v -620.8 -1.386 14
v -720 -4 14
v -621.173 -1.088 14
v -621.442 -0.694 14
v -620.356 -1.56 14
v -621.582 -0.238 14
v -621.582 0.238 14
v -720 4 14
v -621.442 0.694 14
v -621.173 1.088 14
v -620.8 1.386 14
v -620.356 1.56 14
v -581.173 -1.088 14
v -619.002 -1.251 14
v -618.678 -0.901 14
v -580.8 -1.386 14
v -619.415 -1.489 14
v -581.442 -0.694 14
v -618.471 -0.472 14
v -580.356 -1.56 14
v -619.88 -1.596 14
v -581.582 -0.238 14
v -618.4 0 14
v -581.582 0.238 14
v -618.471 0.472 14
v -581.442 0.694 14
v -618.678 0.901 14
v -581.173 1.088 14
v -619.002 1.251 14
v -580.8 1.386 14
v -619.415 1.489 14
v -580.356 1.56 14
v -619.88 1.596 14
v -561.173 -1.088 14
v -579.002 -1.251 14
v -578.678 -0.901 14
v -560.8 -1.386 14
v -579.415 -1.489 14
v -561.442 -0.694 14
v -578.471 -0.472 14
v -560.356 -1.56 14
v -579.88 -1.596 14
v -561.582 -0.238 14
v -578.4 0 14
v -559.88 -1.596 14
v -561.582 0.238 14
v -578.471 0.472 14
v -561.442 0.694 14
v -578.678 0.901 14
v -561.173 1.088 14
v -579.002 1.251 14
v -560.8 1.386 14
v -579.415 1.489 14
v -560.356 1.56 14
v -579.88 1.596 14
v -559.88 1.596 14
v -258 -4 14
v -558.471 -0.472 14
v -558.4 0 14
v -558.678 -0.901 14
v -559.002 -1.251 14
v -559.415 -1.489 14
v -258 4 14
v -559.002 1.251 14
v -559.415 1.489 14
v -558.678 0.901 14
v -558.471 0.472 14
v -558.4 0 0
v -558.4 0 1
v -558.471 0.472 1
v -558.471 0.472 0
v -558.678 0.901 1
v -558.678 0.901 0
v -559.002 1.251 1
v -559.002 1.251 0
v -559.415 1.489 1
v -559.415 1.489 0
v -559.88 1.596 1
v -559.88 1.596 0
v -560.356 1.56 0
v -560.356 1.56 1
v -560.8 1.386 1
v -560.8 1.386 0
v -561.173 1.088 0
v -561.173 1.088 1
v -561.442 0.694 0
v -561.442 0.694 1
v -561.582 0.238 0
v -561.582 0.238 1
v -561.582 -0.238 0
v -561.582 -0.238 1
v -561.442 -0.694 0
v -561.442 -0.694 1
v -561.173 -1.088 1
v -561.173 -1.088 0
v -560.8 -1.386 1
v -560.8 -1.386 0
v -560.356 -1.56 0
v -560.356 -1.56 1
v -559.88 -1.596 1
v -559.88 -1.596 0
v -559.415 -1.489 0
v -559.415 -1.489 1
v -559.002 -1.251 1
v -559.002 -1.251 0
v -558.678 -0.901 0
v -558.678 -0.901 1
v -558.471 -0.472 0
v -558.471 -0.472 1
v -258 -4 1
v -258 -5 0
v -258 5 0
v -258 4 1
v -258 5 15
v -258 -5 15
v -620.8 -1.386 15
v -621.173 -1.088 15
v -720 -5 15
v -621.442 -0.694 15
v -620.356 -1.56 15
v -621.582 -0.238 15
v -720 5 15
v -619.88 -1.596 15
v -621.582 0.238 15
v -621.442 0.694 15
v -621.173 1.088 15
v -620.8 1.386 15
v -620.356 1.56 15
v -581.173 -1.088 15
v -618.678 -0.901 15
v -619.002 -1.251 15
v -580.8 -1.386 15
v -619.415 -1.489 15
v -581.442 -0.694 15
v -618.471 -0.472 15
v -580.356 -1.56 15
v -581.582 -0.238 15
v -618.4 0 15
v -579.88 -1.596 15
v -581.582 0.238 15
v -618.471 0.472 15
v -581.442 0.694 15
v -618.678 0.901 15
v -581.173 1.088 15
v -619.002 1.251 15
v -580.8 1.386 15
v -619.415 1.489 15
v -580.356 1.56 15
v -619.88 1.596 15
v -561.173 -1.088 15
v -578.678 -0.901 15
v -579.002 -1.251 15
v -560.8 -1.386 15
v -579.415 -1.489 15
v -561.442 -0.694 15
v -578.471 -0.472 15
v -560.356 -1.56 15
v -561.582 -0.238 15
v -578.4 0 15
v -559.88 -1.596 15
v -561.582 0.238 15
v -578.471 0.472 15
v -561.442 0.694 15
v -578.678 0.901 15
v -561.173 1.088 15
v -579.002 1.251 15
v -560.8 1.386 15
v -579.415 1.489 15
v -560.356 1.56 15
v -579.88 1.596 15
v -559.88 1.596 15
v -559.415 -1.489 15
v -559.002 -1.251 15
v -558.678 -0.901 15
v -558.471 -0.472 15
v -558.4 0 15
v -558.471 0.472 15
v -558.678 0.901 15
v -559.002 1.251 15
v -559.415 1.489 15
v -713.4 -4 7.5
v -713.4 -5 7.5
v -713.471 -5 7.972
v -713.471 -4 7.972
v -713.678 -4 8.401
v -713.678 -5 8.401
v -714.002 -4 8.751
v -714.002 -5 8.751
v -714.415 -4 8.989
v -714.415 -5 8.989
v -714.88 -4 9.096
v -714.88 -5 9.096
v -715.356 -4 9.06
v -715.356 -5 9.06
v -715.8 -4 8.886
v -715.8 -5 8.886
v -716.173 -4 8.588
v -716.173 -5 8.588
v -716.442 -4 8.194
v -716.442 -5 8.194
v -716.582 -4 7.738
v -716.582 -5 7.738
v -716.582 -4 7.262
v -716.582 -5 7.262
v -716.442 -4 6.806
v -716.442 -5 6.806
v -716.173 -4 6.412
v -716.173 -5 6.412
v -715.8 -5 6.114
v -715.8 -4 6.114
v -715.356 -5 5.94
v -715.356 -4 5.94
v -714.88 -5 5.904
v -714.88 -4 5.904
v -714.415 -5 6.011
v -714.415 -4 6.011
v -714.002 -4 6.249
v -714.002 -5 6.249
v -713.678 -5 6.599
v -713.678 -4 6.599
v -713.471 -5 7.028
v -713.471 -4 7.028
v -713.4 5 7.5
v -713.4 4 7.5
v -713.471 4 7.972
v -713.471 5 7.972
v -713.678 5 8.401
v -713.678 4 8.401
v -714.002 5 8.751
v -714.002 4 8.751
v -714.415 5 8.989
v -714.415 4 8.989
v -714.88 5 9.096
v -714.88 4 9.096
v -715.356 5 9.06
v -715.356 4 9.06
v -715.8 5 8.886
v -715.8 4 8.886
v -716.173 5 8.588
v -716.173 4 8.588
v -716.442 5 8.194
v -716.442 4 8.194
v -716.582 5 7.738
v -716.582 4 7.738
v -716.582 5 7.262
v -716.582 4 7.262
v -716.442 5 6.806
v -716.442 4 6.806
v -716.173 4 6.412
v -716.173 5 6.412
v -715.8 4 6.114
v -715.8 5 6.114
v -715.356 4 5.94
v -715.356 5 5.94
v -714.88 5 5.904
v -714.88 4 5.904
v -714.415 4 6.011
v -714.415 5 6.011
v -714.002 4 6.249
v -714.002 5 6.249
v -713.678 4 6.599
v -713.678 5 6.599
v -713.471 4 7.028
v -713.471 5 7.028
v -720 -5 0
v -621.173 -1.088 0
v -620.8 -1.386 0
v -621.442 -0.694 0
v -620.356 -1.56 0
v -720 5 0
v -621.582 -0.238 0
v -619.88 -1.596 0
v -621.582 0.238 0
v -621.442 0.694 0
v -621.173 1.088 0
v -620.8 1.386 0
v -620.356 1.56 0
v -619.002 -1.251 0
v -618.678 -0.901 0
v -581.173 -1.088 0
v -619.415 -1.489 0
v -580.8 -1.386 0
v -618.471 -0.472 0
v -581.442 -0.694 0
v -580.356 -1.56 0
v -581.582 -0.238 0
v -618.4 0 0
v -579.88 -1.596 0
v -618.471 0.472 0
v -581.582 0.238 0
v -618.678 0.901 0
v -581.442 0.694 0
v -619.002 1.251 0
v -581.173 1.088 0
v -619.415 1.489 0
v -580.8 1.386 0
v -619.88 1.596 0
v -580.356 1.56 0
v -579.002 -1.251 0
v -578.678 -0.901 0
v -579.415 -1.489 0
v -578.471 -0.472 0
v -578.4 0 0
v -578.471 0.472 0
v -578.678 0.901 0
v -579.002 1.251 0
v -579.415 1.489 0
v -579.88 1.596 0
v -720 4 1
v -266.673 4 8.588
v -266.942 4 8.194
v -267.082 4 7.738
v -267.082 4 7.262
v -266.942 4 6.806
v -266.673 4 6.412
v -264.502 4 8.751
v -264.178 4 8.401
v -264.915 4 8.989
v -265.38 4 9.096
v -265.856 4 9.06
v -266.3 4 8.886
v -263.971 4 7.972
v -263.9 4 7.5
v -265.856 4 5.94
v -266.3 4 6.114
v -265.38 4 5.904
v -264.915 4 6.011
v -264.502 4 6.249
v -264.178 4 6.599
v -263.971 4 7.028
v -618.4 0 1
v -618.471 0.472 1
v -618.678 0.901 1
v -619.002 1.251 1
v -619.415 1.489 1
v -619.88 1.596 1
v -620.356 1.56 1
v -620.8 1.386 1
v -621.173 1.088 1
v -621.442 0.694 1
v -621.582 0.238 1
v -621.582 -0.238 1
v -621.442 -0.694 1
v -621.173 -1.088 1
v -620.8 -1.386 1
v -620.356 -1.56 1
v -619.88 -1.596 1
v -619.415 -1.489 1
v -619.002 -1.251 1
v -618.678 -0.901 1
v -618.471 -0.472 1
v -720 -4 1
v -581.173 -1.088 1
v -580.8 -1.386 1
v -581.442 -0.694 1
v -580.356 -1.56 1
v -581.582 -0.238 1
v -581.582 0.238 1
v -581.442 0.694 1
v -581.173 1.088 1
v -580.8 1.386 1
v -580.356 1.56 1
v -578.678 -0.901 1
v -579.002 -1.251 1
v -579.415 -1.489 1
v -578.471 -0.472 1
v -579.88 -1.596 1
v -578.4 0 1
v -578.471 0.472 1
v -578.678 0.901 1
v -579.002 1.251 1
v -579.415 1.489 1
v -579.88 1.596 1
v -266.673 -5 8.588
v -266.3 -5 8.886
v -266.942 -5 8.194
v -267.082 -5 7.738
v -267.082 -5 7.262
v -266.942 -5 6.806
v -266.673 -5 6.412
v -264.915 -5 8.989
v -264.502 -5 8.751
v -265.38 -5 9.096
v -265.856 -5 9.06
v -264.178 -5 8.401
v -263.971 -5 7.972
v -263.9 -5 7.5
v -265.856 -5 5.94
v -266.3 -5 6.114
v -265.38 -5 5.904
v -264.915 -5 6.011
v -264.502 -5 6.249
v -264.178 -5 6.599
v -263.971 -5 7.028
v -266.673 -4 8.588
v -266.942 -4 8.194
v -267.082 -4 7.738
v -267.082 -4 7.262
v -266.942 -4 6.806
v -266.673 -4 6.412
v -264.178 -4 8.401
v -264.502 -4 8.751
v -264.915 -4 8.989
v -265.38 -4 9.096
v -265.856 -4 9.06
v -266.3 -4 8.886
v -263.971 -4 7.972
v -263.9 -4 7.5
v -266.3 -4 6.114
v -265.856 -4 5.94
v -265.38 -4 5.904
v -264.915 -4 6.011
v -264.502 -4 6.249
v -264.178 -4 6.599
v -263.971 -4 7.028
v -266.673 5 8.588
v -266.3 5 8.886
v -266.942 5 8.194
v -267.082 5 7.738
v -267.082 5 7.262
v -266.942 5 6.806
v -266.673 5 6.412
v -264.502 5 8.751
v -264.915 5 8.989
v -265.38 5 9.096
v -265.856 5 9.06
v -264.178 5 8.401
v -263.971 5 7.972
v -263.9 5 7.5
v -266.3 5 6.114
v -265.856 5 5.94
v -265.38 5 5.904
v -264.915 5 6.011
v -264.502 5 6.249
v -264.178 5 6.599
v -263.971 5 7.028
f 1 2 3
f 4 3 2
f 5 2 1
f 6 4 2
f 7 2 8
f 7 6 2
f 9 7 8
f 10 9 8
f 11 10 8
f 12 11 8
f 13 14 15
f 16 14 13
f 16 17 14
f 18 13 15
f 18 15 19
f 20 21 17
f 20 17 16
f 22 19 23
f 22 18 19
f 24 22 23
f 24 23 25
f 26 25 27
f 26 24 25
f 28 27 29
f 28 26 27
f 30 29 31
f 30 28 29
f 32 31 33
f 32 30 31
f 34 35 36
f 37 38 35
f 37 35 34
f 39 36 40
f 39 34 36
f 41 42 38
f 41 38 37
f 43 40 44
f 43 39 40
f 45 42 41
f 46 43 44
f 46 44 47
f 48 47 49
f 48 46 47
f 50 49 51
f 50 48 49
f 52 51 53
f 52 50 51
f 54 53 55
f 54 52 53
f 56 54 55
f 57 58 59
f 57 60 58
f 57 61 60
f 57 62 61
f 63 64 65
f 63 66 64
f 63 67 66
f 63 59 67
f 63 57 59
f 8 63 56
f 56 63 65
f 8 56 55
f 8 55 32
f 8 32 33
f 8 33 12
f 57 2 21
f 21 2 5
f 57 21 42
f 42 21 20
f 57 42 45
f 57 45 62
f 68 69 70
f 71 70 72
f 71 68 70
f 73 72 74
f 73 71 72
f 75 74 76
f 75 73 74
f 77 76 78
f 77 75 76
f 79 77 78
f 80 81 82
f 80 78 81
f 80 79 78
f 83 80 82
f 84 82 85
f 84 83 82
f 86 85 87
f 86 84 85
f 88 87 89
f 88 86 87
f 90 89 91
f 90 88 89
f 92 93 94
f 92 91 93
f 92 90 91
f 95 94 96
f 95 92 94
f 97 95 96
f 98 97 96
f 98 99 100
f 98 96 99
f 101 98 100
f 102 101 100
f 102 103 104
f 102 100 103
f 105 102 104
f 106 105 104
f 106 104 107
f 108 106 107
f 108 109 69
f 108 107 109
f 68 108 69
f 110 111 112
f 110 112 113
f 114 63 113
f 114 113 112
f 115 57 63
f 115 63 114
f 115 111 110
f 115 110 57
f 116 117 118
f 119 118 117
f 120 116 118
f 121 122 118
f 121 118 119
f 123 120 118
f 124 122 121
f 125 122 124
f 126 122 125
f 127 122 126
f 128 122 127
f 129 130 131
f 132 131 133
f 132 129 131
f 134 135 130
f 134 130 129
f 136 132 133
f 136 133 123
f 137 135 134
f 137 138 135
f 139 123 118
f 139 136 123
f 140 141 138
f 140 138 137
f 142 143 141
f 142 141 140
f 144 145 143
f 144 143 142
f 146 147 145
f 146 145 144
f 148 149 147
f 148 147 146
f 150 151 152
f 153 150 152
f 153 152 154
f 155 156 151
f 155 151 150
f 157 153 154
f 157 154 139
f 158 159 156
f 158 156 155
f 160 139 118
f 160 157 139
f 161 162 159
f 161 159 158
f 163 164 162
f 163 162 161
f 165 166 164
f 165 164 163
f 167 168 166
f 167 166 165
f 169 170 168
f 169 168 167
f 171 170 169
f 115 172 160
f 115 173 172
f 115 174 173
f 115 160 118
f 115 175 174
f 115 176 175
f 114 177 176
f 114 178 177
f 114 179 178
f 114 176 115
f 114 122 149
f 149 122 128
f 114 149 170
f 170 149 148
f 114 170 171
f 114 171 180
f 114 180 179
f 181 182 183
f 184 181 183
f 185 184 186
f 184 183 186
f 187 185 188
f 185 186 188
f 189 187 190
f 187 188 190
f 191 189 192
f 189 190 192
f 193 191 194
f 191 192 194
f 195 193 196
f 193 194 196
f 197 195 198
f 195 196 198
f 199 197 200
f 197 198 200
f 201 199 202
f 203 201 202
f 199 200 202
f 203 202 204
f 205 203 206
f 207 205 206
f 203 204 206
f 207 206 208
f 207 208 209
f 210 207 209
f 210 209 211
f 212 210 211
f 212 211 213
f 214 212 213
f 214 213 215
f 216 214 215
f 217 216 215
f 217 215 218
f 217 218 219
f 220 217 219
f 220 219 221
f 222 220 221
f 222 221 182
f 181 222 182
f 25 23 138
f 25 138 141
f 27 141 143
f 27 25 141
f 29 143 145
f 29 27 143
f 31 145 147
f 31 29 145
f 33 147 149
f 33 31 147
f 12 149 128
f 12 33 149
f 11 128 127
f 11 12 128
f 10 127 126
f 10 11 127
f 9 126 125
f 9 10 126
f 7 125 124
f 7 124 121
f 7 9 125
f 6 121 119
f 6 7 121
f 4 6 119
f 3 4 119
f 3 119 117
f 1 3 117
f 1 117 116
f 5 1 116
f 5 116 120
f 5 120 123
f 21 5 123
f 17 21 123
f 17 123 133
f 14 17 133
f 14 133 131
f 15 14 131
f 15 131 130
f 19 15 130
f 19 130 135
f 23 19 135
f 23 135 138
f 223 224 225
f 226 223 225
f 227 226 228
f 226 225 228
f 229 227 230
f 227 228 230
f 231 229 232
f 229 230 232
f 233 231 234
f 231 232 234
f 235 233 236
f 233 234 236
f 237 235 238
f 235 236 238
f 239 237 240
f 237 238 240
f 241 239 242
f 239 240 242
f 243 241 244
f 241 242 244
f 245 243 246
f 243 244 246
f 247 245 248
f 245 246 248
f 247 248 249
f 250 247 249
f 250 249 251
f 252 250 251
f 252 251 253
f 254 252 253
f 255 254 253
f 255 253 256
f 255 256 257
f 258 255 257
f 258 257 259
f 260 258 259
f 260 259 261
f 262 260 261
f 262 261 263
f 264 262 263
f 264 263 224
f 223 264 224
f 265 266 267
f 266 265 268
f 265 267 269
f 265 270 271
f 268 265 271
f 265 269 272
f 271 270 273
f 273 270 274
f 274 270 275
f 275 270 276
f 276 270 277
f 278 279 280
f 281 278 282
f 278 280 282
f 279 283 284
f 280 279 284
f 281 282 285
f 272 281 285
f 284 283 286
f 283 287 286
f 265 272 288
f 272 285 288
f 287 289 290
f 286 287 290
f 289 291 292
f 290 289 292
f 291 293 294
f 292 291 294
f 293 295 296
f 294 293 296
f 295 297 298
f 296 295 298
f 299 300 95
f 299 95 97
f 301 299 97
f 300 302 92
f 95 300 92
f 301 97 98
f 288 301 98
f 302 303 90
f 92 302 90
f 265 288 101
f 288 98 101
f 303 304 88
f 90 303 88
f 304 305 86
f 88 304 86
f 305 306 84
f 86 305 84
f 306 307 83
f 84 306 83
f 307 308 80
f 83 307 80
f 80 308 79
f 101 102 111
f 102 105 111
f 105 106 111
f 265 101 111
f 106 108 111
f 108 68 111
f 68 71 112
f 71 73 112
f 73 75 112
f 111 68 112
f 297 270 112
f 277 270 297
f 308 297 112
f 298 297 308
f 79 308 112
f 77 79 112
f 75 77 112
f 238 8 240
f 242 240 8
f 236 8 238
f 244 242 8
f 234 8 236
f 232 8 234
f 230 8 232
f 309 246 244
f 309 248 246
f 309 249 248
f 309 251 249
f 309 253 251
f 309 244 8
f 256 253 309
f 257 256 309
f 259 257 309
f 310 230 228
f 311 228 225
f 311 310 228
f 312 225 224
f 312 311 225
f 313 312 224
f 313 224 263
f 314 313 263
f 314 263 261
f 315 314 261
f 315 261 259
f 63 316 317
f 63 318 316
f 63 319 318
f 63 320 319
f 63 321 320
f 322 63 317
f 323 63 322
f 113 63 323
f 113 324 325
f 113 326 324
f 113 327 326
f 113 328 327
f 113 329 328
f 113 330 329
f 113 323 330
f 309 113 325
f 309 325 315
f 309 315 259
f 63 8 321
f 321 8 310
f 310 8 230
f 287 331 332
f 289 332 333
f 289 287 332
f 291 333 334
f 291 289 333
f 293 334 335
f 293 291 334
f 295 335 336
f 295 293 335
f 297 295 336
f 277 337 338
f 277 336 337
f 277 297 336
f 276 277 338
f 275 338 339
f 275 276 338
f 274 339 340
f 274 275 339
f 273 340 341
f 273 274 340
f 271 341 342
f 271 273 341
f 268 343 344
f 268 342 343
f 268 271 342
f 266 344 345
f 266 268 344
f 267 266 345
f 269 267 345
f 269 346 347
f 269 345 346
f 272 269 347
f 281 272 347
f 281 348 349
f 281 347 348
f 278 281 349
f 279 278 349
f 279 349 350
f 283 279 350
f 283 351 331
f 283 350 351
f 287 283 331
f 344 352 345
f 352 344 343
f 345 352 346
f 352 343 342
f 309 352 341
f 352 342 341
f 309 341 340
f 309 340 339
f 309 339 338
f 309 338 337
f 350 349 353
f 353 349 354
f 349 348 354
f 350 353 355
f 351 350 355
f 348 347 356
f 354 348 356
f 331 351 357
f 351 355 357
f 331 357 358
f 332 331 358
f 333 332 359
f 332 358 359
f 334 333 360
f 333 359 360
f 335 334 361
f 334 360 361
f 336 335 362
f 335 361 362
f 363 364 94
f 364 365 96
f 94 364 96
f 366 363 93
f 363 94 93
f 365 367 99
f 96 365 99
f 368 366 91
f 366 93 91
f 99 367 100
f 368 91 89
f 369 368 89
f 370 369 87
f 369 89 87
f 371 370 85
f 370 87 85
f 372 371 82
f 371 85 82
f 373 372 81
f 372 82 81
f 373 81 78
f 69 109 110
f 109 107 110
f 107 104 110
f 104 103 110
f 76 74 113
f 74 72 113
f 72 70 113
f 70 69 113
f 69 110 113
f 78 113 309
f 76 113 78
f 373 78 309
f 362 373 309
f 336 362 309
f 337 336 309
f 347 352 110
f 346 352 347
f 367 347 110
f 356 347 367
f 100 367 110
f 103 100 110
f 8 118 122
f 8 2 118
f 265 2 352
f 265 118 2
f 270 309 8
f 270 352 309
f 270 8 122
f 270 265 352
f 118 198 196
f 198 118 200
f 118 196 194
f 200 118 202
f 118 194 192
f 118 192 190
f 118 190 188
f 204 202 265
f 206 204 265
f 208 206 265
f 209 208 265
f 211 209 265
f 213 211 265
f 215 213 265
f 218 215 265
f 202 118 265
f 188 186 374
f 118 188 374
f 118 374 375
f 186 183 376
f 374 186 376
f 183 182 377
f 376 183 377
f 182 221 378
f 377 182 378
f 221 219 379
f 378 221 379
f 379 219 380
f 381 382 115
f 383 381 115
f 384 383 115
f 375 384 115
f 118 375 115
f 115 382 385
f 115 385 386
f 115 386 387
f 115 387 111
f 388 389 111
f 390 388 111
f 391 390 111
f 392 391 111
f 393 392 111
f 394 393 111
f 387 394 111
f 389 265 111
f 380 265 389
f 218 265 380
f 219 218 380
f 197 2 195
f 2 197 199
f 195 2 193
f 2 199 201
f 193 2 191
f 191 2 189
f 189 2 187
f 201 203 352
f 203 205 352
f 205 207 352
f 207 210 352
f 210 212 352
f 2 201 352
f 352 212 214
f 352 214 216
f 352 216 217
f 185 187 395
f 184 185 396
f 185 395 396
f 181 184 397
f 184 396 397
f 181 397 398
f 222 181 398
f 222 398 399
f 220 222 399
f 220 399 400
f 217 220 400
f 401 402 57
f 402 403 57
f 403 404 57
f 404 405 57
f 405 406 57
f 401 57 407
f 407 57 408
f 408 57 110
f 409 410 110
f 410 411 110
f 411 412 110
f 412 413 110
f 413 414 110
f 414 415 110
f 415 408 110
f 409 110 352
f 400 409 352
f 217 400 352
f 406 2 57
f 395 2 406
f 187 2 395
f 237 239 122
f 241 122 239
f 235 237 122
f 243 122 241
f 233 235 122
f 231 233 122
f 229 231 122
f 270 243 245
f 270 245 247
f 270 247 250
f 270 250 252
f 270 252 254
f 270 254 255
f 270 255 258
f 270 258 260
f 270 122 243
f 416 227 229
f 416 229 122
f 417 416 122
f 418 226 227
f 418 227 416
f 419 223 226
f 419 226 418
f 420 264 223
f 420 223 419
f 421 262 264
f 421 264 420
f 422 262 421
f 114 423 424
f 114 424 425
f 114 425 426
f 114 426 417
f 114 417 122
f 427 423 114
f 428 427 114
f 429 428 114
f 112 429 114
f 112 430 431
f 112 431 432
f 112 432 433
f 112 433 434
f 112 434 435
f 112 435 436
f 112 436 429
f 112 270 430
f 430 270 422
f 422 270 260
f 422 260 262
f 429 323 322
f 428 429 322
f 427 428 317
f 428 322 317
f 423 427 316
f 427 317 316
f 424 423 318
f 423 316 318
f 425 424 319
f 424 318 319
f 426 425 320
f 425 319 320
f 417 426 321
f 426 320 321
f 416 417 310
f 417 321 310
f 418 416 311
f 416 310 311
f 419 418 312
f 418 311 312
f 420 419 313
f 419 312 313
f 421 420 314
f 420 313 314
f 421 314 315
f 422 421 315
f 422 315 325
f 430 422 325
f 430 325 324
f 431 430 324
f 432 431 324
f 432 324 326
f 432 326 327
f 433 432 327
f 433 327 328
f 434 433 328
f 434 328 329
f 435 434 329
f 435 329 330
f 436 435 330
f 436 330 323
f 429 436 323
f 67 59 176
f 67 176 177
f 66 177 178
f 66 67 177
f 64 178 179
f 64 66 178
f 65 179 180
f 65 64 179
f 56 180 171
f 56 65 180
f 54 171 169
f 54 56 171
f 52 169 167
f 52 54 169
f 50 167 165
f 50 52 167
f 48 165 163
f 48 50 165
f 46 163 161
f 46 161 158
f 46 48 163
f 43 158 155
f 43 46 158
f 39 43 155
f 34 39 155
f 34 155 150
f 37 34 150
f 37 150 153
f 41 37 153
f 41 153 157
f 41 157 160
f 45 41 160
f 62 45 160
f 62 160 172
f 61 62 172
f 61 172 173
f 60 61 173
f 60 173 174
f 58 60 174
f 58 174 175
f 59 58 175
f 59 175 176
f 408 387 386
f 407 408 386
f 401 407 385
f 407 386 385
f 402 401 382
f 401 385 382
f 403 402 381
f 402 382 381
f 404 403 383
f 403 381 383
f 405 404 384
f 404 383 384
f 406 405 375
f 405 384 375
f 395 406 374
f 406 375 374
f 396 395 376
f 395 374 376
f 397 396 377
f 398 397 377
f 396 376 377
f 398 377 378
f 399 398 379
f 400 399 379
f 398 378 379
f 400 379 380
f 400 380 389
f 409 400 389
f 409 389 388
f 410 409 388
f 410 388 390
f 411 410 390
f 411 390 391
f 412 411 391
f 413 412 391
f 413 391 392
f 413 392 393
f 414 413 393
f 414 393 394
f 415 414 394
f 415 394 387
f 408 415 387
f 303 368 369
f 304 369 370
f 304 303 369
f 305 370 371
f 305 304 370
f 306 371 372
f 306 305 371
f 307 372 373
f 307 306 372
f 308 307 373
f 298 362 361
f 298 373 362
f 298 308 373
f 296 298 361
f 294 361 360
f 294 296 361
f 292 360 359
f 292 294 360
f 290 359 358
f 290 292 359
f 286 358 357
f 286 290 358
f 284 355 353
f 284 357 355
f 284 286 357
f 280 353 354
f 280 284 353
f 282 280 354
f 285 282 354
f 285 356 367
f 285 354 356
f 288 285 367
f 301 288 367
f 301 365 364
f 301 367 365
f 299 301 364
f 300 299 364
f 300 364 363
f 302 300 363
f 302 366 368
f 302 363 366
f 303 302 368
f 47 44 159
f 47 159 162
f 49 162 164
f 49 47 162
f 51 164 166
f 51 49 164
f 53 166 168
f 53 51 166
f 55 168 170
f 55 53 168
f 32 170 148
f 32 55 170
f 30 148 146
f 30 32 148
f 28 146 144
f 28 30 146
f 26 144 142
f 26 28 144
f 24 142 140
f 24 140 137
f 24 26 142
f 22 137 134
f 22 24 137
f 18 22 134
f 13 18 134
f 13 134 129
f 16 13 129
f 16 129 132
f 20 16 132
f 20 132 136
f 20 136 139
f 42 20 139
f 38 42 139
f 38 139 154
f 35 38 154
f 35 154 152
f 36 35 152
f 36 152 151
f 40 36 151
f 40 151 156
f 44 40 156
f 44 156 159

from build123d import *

# Parameters (mm, degrees)
SKETCH_1_W          = 220
SKETCH_1_H          = 10
SKETCH_1_R          = 1.6
EXTRUDE_1_DEPTH     = 15
SKETCH_2_W          = 13
SKETCH_2_H          = 8
CUT_EXTRUDE_1_DEPTH = 2000
SKETCH_3_R          = 1.6
CUT_EXTRUDE_2_DEPTH = 1000
SKETCH_7_W          = 242
SKETCH_7_H          = 15
SKETCH_7_R          = 1.6
EXTRUDE_3_DEPTH     = 10
SKETCH_8_W          = 13
SKETCH_8_H          = 8
CUT_EXTRUDE_4_DEPTH = 1000


with BuildPart() as part:
    # ｽｹｯﾁ1 → ﾎﾞｽ - 押し出し1 (new body)
    with BuildSketch(Plane.XY):
        with Locations((-610, 0)):
            Rectangle(SKETCH_1_W, SKETCH_1_H)
        with Locations((-620, 0)):
            Circle(SKETCH_1_R, mode=Mode.SUBTRACT)
        with Locations((-580, 0)):
            Circle(SKETCH_1_R, mode=Mode.SUBTRACT)
        with Locations((-560, 0)):
            Circle(SKETCH_1_R, mode=Mode.SUBTRACT)
    extrude(amount=EXTRUDE_1_DEPTH)

    # ｽｹｯﾁ2 → ｶｯﾄ - 押し出し1 (cut)
    with BuildSketch(Plane(origin=(-500, 0, 0), x_dir=(0, 0, -1), z_dir=(1, 0, 0))):
        with Locations((-7.5, 0)):
            Rectangle(SKETCH_2_W, SKETCH_2_H)
    extrude(amount=-CUT_EXTRUDE_1_DEPTH, mode=Mode.SUBTRACT)

    # ｽｹｯﾁ3 → ｶｯﾄ - 押し出し2 (cut)
    with BuildSketch(Plane(origin=(0, -5, 0), x_dir=(-1, 0, 0), z_dir=(0, -1, 0))):
        with Locations(Location((715, -7.5, 0), (0, 0, 180))):
            Circle(SKETCH_3_R)
    extrude(amount=-CUT_EXTRUDE_2_DEPTH, mode=Mode.SUBTRACT)

    # ｽｹｯﾁ7 → ﾎﾞｽ - 押し出し3 (add)
    with BuildSketch(Plane.XZ.offset(5)):
        with Locations((-379, 7.5)):
            Rectangle(SKETCH_7_W, SKETCH_7_H)
        with Locations((-265.5, 7.5)):
            Circle(SKETCH_7_R, mode=Mode.SUBTRACT)
    extrude(amount=-EXTRUDE_3_DEPTH)

    # ｽｹｯﾁ8 → ｶｯﾄ - 押し出し4 (cut)
    with BuildSketch(Plane.ZY.offset(720)):
        with Locations((7.5, 0)):
            Rectangle(SKETCH_8_W, SKETCH_8_H)
    extrude(amount=-CUT_EXTRUDE_4_DEPTH, mode=Mode.SUBTRACT)


solid = part.part
